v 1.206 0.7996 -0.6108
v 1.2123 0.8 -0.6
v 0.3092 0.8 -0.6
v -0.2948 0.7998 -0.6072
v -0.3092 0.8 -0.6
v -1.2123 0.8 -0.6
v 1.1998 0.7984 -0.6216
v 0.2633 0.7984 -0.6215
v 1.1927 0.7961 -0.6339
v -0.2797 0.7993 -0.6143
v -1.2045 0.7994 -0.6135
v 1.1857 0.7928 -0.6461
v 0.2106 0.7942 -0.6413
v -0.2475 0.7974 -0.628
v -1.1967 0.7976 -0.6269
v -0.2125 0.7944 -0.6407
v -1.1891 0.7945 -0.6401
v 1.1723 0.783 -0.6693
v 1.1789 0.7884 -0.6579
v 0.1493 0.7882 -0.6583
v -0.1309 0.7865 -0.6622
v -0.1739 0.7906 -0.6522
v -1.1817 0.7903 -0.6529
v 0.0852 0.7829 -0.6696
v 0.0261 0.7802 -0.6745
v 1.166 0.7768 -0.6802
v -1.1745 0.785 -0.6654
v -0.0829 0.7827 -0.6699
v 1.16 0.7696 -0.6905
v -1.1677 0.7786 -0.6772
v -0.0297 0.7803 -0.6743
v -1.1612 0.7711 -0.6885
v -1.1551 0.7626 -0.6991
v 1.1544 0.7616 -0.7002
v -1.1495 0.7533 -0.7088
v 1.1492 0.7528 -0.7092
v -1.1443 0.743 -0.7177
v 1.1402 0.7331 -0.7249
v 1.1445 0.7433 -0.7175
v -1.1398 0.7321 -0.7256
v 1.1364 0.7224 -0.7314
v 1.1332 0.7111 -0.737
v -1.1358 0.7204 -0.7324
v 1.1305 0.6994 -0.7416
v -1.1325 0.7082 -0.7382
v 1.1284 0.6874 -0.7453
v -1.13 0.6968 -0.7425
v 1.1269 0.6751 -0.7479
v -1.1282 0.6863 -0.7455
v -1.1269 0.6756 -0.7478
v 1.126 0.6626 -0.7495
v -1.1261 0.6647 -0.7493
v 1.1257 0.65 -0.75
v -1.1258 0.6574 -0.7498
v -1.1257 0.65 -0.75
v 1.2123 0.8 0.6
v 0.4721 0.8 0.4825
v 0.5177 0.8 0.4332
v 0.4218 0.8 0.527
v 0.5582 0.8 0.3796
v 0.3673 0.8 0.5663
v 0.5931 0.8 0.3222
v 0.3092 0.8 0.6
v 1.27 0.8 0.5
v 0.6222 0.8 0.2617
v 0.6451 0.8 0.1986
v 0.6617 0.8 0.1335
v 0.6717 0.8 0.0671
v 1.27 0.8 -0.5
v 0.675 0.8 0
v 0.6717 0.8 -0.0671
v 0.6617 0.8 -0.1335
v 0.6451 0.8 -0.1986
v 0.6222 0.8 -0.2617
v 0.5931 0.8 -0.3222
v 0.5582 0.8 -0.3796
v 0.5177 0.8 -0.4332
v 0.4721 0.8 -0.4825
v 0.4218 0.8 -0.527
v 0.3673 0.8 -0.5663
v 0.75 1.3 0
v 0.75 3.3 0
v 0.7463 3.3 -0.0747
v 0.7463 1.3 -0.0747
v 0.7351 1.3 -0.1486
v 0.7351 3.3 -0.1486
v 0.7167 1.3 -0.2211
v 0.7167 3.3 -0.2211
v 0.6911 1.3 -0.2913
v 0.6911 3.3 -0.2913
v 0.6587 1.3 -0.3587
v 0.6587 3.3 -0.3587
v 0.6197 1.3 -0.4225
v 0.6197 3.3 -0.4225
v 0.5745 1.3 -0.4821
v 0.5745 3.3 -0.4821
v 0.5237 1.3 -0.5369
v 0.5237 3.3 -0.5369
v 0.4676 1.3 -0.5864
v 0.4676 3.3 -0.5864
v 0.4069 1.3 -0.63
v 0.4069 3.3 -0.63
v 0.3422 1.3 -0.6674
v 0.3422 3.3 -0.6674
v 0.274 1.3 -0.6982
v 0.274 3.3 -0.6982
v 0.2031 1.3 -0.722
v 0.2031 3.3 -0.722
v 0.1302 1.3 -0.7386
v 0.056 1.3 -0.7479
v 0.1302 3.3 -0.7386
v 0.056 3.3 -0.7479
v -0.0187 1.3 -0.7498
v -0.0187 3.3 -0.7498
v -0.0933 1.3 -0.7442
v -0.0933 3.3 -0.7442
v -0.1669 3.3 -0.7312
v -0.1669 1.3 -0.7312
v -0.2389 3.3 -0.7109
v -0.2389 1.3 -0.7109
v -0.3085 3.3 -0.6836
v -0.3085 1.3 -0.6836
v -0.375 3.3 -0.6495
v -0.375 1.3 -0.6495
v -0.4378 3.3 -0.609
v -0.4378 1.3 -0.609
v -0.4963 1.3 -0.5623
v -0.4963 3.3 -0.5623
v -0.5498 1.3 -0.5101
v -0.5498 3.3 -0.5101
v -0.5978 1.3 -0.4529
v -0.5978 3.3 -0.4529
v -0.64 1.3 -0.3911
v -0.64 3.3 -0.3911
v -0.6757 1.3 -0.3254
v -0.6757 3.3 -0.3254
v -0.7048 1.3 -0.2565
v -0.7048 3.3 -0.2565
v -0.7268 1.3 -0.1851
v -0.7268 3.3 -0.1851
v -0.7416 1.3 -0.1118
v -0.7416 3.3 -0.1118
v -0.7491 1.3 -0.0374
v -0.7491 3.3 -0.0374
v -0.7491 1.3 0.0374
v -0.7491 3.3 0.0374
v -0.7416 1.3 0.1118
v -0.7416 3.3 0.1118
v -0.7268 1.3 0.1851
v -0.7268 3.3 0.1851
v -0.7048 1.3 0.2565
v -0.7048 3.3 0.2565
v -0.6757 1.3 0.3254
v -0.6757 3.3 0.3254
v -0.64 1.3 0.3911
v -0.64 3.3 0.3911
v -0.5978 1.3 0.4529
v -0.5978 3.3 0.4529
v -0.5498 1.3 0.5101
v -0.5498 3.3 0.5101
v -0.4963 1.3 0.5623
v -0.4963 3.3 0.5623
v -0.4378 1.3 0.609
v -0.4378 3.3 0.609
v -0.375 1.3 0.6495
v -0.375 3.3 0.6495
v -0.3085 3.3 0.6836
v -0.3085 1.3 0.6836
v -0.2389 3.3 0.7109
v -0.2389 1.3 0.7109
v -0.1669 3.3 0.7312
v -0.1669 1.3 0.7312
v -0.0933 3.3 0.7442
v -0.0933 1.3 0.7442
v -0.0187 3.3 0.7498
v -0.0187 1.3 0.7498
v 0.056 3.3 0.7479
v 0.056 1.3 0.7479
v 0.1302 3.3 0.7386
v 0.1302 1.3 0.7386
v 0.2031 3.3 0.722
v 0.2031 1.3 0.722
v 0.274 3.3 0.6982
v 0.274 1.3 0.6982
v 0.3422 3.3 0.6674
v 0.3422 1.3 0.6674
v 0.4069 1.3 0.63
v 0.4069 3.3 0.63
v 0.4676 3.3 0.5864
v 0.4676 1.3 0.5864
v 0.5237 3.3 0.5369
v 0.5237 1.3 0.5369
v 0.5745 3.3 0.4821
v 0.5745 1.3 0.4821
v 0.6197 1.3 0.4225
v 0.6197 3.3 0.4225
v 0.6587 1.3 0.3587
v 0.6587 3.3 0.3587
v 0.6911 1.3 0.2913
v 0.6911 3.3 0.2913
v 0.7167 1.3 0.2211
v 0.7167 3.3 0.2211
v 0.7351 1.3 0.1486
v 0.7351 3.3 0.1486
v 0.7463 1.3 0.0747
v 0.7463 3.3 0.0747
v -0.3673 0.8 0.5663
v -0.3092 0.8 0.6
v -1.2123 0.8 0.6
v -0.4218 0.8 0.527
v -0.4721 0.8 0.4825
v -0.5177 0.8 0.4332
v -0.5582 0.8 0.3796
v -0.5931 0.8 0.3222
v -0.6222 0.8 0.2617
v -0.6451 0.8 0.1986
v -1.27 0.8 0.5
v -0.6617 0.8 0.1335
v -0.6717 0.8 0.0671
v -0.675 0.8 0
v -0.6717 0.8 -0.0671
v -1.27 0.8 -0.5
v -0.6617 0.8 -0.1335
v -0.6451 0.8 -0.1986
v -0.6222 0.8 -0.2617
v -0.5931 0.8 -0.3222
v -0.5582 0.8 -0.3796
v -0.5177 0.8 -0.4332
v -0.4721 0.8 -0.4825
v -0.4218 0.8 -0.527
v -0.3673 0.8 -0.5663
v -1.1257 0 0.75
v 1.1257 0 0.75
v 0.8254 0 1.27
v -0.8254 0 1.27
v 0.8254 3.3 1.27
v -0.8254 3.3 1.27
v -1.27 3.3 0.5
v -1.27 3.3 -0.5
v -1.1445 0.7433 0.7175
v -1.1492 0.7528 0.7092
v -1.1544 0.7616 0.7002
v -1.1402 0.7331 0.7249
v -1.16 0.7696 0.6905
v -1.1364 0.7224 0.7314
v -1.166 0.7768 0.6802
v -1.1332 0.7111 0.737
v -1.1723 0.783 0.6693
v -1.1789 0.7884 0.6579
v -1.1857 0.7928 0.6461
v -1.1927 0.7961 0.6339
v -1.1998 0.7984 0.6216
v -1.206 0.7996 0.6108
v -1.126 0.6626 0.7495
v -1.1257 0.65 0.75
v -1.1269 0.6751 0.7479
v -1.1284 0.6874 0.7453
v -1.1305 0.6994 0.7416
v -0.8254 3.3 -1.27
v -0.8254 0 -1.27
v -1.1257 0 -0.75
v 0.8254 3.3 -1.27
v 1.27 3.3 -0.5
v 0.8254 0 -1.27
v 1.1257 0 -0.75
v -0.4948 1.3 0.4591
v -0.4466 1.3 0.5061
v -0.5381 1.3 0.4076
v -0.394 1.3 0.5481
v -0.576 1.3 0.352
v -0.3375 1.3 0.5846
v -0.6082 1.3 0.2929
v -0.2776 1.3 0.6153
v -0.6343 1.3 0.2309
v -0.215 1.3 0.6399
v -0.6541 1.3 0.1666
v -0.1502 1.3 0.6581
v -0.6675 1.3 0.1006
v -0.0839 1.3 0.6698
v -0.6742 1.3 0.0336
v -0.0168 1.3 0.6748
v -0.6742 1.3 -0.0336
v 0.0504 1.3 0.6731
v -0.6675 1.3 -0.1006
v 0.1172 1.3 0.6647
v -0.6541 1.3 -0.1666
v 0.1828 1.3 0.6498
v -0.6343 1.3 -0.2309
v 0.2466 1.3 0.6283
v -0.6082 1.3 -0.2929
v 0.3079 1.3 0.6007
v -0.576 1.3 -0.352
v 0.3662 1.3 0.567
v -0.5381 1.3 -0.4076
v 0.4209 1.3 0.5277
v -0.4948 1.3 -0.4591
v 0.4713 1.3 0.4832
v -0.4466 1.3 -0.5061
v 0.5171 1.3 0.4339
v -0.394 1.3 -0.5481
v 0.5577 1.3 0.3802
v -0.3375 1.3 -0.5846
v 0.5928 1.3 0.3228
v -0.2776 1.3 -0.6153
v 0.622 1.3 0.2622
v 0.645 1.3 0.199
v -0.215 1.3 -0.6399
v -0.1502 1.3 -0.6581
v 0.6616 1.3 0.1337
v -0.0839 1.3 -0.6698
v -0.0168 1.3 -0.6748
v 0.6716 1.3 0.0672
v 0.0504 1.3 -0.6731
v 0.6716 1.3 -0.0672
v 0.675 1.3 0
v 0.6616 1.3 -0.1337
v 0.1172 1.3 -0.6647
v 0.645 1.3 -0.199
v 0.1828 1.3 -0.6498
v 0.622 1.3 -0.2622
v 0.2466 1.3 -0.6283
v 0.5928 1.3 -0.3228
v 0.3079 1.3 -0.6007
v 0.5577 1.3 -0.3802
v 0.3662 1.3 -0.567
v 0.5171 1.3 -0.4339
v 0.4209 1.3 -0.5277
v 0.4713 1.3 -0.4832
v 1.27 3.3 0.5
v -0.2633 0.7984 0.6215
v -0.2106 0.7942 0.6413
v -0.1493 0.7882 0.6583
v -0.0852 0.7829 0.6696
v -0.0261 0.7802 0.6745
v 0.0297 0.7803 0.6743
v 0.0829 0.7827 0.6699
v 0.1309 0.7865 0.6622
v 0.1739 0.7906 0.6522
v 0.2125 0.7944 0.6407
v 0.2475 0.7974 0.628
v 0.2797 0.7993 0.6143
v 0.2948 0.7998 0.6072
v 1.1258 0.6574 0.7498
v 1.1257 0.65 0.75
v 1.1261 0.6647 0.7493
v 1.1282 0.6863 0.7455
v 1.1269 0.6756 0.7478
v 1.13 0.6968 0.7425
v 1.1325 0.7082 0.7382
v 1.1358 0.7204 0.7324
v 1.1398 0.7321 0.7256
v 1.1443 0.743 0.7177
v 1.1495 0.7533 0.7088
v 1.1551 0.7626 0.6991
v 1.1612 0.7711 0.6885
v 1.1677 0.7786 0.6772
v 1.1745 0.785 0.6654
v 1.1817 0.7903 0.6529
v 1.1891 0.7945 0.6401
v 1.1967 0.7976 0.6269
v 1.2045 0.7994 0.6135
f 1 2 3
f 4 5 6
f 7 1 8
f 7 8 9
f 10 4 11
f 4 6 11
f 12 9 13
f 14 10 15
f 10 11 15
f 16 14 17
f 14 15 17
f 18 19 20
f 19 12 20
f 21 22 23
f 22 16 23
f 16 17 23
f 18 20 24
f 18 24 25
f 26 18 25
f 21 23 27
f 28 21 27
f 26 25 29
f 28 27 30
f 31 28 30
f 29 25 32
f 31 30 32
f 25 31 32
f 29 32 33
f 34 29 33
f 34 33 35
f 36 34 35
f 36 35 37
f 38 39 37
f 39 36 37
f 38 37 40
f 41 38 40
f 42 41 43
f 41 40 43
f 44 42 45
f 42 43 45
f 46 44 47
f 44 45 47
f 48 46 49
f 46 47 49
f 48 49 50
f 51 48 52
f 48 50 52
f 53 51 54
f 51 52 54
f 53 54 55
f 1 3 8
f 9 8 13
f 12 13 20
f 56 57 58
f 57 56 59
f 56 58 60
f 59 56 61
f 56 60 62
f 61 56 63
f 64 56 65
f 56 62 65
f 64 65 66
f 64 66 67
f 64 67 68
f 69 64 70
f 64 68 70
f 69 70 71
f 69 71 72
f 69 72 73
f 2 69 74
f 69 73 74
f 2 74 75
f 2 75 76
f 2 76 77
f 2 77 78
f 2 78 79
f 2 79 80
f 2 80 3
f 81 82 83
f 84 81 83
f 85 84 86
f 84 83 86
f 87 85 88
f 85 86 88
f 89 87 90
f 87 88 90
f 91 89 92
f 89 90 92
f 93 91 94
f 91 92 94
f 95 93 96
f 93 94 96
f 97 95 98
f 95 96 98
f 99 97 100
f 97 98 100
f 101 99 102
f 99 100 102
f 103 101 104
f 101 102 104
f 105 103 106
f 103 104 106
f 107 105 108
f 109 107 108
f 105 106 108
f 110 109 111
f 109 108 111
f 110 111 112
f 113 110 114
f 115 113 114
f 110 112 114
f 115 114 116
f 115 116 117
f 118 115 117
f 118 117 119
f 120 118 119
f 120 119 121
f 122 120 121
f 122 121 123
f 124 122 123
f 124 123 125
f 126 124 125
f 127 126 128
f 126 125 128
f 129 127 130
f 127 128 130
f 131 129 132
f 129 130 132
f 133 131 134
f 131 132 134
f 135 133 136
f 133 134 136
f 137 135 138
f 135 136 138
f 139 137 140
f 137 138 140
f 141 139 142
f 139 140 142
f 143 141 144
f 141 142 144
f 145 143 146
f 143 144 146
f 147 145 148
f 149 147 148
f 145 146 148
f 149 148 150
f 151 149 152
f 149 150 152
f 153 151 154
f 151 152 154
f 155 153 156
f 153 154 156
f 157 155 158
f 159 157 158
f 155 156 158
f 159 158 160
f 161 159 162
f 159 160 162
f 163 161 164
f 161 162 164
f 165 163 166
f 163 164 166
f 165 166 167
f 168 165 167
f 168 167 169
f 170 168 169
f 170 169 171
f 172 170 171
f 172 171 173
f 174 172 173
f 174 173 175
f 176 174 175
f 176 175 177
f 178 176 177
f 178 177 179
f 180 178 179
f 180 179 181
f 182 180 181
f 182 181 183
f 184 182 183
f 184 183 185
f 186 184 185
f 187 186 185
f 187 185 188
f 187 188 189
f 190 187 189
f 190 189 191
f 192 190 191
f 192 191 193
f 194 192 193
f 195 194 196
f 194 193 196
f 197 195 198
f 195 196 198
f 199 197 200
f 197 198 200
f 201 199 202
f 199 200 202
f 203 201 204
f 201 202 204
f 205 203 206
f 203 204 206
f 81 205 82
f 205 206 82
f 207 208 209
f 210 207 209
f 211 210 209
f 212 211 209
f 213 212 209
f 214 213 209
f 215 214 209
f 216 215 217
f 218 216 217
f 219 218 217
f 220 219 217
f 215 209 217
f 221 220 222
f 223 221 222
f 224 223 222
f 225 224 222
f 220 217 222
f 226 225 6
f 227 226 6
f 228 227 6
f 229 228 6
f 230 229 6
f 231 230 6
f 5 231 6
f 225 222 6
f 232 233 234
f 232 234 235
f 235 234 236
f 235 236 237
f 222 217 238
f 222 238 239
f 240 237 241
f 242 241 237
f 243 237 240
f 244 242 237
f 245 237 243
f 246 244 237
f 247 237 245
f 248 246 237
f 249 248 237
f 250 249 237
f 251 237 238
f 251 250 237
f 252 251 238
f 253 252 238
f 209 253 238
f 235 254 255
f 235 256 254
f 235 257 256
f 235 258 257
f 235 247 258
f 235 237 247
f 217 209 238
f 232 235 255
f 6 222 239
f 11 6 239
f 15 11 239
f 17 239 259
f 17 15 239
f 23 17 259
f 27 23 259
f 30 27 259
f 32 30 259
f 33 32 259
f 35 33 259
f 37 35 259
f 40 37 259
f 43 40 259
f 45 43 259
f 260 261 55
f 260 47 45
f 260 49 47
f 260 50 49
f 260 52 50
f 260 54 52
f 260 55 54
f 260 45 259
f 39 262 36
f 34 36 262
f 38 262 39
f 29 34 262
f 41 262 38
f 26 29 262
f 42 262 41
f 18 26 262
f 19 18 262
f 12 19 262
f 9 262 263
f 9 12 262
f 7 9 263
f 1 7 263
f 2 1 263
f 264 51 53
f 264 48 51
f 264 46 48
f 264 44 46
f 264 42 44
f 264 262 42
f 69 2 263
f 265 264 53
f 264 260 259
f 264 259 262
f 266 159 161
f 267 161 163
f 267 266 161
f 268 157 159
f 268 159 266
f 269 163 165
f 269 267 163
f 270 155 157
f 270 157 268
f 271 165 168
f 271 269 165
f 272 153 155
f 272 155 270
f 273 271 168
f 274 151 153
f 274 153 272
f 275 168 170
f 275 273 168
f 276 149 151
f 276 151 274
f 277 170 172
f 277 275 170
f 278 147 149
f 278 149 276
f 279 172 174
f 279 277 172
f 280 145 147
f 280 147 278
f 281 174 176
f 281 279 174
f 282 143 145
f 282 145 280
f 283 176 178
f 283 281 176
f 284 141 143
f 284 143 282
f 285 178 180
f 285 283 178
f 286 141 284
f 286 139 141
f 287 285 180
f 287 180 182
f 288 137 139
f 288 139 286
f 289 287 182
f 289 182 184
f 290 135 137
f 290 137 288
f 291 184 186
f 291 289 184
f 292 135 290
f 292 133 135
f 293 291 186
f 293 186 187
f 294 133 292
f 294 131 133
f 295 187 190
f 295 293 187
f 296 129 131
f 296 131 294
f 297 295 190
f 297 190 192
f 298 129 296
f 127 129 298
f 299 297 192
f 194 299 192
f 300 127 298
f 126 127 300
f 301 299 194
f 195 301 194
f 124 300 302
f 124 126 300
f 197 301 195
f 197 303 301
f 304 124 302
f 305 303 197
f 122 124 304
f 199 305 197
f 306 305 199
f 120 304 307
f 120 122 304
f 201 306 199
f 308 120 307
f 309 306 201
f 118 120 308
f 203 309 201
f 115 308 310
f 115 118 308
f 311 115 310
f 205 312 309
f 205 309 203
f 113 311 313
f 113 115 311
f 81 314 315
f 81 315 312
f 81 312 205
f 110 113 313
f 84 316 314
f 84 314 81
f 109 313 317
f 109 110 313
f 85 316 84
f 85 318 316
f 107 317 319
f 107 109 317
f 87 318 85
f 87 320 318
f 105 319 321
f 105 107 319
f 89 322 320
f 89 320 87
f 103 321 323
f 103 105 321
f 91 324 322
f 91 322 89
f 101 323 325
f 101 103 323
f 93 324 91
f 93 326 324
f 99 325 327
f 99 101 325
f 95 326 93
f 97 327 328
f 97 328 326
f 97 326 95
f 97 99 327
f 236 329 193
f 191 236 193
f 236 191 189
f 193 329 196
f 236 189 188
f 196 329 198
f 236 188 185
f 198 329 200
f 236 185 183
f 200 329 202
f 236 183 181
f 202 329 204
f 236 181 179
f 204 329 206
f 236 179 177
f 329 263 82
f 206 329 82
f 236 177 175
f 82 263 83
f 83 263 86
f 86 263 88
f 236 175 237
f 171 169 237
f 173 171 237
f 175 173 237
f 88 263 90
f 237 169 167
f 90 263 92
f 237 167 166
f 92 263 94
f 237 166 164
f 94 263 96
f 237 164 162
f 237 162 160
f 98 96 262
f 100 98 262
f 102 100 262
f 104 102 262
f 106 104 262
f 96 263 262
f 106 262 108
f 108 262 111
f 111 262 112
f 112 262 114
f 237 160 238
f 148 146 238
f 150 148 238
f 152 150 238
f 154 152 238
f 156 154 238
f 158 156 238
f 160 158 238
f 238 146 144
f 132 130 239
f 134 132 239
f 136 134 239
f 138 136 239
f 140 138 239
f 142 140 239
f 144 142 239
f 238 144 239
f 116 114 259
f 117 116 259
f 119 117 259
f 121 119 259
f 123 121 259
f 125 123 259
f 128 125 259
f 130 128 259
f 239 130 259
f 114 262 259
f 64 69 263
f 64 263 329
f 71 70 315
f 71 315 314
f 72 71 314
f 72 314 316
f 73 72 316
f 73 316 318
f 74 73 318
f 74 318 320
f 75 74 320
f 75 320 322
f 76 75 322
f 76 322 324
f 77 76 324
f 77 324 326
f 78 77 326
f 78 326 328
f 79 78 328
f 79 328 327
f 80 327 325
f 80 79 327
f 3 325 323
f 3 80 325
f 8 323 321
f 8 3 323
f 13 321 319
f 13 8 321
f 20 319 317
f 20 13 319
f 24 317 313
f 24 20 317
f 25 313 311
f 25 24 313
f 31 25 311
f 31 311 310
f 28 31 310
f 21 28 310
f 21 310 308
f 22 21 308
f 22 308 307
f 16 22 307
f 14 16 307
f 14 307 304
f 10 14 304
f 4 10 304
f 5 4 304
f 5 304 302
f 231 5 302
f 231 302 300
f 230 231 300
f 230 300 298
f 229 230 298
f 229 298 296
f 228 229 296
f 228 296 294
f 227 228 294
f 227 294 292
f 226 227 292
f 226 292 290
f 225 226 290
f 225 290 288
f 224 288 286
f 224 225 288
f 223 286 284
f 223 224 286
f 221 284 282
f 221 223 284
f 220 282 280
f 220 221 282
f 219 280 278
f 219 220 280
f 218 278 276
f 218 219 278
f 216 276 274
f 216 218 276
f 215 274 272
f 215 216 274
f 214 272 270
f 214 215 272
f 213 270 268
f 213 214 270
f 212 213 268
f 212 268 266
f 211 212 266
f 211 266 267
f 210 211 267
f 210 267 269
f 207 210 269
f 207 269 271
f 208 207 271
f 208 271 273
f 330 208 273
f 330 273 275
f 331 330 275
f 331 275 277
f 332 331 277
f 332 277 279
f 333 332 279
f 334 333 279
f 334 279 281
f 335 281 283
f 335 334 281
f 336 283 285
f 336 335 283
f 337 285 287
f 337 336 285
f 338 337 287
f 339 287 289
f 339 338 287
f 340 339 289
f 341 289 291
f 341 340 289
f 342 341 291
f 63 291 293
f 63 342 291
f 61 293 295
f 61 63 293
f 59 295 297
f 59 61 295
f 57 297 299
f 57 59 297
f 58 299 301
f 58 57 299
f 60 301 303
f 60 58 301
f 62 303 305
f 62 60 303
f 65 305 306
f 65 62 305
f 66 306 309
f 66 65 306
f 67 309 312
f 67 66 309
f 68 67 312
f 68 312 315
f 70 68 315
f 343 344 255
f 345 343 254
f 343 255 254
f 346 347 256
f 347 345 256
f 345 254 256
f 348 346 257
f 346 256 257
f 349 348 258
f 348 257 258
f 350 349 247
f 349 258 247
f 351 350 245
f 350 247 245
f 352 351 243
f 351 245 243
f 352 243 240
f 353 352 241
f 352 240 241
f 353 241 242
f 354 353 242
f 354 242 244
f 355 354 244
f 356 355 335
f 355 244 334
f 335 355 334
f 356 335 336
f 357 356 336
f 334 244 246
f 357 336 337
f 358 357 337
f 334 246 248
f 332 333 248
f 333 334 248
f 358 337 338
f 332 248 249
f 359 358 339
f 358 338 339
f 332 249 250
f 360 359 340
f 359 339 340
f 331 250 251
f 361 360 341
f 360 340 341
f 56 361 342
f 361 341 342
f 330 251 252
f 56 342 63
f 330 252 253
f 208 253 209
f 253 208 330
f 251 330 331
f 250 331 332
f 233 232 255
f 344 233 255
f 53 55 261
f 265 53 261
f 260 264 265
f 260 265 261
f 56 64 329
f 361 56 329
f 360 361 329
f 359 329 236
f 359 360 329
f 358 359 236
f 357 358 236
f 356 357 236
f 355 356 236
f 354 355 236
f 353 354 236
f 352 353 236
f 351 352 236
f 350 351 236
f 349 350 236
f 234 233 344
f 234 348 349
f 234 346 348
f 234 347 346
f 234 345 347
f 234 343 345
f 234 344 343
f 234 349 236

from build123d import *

# Parameters (mm, degrees)
SKETCH1_R           = 0.675
BOSS_EXTRUDE1_DEPTH = 3.3
CUT_EXTRUDE1_REACH  = 4.54
SKETCH3_R           = 0.75
CUT_EXTRUDE2_DEPTH  = 2


with BuildPart() as part:
    # Sketch1 → Boss-Extrude1 (new body)
    with BuildSketch(Plane(origin=(0, 0, 0), x_dir=(1, 0, 0), z_dir=(0, 1, 0))):
        Polygon((-0.825440293, 1.27), (0.825440293, 1.27), (1.27, 0.5), (1.27, -0.5), (0.825440293, -1.27), (-0.825440293, -1.27), (-1.27, -0.5), (-1.27, 0.5), align=None)
        Circle(SKETCH1_R, mode=Mode.SUBTRACT)
    extrude(amount=BOSS_EXTRUDE1_DEPTH)

    # Sketch2 → Cut-Extrude1 (cut, up to next)
    with BuildSketch(Plane.ZY.offset(1.27), mode=Mode.PRIVATE) as cut_extrude1_sk1:
        with BuildLine():
            Line((-0.75, 0), (0.75, 0))
            Line((0.75, 0), (0.75, 0.65))
            ThreePointArc((0.75, 0.65), (0.706066017, 0.756066017), (0.6, 0.8))
            Line((0.6, 0.8), (-0.6, 0.8))
            ThreePointArc((-0.6, 0.8), (-0.706066017, 0.756066017), (-0.75, 0.65))
            Line((-0.75, 0.65), (-0.75, 0))
        make_face()
    cut_extrude1_tool1 = extrude(cut_extrude1_sk1.sketch, amount=-CUT_EXTRUDE1_REACH, mode=Mode.PRIVATE) & part.part
    add(cut_extrude1_tool1.solids().sort_by_distance((-1.27, 0.397027, 0))[0], mode=Mode.SUBTRACT)

    # Sketch3 → Cut-Extrude2 (cut)
    with BuildSketch(Plane(origin=(0, 3.3, 0), x_dir=(1, 0, 0), z_dir=(0, 1, 0))):
        Circle(SKETCH3_R)
    extrude(amount=-CUT_EXTRUDE2_DEPTH, mode=Mode.SUBTRACT)


solid = part.part
